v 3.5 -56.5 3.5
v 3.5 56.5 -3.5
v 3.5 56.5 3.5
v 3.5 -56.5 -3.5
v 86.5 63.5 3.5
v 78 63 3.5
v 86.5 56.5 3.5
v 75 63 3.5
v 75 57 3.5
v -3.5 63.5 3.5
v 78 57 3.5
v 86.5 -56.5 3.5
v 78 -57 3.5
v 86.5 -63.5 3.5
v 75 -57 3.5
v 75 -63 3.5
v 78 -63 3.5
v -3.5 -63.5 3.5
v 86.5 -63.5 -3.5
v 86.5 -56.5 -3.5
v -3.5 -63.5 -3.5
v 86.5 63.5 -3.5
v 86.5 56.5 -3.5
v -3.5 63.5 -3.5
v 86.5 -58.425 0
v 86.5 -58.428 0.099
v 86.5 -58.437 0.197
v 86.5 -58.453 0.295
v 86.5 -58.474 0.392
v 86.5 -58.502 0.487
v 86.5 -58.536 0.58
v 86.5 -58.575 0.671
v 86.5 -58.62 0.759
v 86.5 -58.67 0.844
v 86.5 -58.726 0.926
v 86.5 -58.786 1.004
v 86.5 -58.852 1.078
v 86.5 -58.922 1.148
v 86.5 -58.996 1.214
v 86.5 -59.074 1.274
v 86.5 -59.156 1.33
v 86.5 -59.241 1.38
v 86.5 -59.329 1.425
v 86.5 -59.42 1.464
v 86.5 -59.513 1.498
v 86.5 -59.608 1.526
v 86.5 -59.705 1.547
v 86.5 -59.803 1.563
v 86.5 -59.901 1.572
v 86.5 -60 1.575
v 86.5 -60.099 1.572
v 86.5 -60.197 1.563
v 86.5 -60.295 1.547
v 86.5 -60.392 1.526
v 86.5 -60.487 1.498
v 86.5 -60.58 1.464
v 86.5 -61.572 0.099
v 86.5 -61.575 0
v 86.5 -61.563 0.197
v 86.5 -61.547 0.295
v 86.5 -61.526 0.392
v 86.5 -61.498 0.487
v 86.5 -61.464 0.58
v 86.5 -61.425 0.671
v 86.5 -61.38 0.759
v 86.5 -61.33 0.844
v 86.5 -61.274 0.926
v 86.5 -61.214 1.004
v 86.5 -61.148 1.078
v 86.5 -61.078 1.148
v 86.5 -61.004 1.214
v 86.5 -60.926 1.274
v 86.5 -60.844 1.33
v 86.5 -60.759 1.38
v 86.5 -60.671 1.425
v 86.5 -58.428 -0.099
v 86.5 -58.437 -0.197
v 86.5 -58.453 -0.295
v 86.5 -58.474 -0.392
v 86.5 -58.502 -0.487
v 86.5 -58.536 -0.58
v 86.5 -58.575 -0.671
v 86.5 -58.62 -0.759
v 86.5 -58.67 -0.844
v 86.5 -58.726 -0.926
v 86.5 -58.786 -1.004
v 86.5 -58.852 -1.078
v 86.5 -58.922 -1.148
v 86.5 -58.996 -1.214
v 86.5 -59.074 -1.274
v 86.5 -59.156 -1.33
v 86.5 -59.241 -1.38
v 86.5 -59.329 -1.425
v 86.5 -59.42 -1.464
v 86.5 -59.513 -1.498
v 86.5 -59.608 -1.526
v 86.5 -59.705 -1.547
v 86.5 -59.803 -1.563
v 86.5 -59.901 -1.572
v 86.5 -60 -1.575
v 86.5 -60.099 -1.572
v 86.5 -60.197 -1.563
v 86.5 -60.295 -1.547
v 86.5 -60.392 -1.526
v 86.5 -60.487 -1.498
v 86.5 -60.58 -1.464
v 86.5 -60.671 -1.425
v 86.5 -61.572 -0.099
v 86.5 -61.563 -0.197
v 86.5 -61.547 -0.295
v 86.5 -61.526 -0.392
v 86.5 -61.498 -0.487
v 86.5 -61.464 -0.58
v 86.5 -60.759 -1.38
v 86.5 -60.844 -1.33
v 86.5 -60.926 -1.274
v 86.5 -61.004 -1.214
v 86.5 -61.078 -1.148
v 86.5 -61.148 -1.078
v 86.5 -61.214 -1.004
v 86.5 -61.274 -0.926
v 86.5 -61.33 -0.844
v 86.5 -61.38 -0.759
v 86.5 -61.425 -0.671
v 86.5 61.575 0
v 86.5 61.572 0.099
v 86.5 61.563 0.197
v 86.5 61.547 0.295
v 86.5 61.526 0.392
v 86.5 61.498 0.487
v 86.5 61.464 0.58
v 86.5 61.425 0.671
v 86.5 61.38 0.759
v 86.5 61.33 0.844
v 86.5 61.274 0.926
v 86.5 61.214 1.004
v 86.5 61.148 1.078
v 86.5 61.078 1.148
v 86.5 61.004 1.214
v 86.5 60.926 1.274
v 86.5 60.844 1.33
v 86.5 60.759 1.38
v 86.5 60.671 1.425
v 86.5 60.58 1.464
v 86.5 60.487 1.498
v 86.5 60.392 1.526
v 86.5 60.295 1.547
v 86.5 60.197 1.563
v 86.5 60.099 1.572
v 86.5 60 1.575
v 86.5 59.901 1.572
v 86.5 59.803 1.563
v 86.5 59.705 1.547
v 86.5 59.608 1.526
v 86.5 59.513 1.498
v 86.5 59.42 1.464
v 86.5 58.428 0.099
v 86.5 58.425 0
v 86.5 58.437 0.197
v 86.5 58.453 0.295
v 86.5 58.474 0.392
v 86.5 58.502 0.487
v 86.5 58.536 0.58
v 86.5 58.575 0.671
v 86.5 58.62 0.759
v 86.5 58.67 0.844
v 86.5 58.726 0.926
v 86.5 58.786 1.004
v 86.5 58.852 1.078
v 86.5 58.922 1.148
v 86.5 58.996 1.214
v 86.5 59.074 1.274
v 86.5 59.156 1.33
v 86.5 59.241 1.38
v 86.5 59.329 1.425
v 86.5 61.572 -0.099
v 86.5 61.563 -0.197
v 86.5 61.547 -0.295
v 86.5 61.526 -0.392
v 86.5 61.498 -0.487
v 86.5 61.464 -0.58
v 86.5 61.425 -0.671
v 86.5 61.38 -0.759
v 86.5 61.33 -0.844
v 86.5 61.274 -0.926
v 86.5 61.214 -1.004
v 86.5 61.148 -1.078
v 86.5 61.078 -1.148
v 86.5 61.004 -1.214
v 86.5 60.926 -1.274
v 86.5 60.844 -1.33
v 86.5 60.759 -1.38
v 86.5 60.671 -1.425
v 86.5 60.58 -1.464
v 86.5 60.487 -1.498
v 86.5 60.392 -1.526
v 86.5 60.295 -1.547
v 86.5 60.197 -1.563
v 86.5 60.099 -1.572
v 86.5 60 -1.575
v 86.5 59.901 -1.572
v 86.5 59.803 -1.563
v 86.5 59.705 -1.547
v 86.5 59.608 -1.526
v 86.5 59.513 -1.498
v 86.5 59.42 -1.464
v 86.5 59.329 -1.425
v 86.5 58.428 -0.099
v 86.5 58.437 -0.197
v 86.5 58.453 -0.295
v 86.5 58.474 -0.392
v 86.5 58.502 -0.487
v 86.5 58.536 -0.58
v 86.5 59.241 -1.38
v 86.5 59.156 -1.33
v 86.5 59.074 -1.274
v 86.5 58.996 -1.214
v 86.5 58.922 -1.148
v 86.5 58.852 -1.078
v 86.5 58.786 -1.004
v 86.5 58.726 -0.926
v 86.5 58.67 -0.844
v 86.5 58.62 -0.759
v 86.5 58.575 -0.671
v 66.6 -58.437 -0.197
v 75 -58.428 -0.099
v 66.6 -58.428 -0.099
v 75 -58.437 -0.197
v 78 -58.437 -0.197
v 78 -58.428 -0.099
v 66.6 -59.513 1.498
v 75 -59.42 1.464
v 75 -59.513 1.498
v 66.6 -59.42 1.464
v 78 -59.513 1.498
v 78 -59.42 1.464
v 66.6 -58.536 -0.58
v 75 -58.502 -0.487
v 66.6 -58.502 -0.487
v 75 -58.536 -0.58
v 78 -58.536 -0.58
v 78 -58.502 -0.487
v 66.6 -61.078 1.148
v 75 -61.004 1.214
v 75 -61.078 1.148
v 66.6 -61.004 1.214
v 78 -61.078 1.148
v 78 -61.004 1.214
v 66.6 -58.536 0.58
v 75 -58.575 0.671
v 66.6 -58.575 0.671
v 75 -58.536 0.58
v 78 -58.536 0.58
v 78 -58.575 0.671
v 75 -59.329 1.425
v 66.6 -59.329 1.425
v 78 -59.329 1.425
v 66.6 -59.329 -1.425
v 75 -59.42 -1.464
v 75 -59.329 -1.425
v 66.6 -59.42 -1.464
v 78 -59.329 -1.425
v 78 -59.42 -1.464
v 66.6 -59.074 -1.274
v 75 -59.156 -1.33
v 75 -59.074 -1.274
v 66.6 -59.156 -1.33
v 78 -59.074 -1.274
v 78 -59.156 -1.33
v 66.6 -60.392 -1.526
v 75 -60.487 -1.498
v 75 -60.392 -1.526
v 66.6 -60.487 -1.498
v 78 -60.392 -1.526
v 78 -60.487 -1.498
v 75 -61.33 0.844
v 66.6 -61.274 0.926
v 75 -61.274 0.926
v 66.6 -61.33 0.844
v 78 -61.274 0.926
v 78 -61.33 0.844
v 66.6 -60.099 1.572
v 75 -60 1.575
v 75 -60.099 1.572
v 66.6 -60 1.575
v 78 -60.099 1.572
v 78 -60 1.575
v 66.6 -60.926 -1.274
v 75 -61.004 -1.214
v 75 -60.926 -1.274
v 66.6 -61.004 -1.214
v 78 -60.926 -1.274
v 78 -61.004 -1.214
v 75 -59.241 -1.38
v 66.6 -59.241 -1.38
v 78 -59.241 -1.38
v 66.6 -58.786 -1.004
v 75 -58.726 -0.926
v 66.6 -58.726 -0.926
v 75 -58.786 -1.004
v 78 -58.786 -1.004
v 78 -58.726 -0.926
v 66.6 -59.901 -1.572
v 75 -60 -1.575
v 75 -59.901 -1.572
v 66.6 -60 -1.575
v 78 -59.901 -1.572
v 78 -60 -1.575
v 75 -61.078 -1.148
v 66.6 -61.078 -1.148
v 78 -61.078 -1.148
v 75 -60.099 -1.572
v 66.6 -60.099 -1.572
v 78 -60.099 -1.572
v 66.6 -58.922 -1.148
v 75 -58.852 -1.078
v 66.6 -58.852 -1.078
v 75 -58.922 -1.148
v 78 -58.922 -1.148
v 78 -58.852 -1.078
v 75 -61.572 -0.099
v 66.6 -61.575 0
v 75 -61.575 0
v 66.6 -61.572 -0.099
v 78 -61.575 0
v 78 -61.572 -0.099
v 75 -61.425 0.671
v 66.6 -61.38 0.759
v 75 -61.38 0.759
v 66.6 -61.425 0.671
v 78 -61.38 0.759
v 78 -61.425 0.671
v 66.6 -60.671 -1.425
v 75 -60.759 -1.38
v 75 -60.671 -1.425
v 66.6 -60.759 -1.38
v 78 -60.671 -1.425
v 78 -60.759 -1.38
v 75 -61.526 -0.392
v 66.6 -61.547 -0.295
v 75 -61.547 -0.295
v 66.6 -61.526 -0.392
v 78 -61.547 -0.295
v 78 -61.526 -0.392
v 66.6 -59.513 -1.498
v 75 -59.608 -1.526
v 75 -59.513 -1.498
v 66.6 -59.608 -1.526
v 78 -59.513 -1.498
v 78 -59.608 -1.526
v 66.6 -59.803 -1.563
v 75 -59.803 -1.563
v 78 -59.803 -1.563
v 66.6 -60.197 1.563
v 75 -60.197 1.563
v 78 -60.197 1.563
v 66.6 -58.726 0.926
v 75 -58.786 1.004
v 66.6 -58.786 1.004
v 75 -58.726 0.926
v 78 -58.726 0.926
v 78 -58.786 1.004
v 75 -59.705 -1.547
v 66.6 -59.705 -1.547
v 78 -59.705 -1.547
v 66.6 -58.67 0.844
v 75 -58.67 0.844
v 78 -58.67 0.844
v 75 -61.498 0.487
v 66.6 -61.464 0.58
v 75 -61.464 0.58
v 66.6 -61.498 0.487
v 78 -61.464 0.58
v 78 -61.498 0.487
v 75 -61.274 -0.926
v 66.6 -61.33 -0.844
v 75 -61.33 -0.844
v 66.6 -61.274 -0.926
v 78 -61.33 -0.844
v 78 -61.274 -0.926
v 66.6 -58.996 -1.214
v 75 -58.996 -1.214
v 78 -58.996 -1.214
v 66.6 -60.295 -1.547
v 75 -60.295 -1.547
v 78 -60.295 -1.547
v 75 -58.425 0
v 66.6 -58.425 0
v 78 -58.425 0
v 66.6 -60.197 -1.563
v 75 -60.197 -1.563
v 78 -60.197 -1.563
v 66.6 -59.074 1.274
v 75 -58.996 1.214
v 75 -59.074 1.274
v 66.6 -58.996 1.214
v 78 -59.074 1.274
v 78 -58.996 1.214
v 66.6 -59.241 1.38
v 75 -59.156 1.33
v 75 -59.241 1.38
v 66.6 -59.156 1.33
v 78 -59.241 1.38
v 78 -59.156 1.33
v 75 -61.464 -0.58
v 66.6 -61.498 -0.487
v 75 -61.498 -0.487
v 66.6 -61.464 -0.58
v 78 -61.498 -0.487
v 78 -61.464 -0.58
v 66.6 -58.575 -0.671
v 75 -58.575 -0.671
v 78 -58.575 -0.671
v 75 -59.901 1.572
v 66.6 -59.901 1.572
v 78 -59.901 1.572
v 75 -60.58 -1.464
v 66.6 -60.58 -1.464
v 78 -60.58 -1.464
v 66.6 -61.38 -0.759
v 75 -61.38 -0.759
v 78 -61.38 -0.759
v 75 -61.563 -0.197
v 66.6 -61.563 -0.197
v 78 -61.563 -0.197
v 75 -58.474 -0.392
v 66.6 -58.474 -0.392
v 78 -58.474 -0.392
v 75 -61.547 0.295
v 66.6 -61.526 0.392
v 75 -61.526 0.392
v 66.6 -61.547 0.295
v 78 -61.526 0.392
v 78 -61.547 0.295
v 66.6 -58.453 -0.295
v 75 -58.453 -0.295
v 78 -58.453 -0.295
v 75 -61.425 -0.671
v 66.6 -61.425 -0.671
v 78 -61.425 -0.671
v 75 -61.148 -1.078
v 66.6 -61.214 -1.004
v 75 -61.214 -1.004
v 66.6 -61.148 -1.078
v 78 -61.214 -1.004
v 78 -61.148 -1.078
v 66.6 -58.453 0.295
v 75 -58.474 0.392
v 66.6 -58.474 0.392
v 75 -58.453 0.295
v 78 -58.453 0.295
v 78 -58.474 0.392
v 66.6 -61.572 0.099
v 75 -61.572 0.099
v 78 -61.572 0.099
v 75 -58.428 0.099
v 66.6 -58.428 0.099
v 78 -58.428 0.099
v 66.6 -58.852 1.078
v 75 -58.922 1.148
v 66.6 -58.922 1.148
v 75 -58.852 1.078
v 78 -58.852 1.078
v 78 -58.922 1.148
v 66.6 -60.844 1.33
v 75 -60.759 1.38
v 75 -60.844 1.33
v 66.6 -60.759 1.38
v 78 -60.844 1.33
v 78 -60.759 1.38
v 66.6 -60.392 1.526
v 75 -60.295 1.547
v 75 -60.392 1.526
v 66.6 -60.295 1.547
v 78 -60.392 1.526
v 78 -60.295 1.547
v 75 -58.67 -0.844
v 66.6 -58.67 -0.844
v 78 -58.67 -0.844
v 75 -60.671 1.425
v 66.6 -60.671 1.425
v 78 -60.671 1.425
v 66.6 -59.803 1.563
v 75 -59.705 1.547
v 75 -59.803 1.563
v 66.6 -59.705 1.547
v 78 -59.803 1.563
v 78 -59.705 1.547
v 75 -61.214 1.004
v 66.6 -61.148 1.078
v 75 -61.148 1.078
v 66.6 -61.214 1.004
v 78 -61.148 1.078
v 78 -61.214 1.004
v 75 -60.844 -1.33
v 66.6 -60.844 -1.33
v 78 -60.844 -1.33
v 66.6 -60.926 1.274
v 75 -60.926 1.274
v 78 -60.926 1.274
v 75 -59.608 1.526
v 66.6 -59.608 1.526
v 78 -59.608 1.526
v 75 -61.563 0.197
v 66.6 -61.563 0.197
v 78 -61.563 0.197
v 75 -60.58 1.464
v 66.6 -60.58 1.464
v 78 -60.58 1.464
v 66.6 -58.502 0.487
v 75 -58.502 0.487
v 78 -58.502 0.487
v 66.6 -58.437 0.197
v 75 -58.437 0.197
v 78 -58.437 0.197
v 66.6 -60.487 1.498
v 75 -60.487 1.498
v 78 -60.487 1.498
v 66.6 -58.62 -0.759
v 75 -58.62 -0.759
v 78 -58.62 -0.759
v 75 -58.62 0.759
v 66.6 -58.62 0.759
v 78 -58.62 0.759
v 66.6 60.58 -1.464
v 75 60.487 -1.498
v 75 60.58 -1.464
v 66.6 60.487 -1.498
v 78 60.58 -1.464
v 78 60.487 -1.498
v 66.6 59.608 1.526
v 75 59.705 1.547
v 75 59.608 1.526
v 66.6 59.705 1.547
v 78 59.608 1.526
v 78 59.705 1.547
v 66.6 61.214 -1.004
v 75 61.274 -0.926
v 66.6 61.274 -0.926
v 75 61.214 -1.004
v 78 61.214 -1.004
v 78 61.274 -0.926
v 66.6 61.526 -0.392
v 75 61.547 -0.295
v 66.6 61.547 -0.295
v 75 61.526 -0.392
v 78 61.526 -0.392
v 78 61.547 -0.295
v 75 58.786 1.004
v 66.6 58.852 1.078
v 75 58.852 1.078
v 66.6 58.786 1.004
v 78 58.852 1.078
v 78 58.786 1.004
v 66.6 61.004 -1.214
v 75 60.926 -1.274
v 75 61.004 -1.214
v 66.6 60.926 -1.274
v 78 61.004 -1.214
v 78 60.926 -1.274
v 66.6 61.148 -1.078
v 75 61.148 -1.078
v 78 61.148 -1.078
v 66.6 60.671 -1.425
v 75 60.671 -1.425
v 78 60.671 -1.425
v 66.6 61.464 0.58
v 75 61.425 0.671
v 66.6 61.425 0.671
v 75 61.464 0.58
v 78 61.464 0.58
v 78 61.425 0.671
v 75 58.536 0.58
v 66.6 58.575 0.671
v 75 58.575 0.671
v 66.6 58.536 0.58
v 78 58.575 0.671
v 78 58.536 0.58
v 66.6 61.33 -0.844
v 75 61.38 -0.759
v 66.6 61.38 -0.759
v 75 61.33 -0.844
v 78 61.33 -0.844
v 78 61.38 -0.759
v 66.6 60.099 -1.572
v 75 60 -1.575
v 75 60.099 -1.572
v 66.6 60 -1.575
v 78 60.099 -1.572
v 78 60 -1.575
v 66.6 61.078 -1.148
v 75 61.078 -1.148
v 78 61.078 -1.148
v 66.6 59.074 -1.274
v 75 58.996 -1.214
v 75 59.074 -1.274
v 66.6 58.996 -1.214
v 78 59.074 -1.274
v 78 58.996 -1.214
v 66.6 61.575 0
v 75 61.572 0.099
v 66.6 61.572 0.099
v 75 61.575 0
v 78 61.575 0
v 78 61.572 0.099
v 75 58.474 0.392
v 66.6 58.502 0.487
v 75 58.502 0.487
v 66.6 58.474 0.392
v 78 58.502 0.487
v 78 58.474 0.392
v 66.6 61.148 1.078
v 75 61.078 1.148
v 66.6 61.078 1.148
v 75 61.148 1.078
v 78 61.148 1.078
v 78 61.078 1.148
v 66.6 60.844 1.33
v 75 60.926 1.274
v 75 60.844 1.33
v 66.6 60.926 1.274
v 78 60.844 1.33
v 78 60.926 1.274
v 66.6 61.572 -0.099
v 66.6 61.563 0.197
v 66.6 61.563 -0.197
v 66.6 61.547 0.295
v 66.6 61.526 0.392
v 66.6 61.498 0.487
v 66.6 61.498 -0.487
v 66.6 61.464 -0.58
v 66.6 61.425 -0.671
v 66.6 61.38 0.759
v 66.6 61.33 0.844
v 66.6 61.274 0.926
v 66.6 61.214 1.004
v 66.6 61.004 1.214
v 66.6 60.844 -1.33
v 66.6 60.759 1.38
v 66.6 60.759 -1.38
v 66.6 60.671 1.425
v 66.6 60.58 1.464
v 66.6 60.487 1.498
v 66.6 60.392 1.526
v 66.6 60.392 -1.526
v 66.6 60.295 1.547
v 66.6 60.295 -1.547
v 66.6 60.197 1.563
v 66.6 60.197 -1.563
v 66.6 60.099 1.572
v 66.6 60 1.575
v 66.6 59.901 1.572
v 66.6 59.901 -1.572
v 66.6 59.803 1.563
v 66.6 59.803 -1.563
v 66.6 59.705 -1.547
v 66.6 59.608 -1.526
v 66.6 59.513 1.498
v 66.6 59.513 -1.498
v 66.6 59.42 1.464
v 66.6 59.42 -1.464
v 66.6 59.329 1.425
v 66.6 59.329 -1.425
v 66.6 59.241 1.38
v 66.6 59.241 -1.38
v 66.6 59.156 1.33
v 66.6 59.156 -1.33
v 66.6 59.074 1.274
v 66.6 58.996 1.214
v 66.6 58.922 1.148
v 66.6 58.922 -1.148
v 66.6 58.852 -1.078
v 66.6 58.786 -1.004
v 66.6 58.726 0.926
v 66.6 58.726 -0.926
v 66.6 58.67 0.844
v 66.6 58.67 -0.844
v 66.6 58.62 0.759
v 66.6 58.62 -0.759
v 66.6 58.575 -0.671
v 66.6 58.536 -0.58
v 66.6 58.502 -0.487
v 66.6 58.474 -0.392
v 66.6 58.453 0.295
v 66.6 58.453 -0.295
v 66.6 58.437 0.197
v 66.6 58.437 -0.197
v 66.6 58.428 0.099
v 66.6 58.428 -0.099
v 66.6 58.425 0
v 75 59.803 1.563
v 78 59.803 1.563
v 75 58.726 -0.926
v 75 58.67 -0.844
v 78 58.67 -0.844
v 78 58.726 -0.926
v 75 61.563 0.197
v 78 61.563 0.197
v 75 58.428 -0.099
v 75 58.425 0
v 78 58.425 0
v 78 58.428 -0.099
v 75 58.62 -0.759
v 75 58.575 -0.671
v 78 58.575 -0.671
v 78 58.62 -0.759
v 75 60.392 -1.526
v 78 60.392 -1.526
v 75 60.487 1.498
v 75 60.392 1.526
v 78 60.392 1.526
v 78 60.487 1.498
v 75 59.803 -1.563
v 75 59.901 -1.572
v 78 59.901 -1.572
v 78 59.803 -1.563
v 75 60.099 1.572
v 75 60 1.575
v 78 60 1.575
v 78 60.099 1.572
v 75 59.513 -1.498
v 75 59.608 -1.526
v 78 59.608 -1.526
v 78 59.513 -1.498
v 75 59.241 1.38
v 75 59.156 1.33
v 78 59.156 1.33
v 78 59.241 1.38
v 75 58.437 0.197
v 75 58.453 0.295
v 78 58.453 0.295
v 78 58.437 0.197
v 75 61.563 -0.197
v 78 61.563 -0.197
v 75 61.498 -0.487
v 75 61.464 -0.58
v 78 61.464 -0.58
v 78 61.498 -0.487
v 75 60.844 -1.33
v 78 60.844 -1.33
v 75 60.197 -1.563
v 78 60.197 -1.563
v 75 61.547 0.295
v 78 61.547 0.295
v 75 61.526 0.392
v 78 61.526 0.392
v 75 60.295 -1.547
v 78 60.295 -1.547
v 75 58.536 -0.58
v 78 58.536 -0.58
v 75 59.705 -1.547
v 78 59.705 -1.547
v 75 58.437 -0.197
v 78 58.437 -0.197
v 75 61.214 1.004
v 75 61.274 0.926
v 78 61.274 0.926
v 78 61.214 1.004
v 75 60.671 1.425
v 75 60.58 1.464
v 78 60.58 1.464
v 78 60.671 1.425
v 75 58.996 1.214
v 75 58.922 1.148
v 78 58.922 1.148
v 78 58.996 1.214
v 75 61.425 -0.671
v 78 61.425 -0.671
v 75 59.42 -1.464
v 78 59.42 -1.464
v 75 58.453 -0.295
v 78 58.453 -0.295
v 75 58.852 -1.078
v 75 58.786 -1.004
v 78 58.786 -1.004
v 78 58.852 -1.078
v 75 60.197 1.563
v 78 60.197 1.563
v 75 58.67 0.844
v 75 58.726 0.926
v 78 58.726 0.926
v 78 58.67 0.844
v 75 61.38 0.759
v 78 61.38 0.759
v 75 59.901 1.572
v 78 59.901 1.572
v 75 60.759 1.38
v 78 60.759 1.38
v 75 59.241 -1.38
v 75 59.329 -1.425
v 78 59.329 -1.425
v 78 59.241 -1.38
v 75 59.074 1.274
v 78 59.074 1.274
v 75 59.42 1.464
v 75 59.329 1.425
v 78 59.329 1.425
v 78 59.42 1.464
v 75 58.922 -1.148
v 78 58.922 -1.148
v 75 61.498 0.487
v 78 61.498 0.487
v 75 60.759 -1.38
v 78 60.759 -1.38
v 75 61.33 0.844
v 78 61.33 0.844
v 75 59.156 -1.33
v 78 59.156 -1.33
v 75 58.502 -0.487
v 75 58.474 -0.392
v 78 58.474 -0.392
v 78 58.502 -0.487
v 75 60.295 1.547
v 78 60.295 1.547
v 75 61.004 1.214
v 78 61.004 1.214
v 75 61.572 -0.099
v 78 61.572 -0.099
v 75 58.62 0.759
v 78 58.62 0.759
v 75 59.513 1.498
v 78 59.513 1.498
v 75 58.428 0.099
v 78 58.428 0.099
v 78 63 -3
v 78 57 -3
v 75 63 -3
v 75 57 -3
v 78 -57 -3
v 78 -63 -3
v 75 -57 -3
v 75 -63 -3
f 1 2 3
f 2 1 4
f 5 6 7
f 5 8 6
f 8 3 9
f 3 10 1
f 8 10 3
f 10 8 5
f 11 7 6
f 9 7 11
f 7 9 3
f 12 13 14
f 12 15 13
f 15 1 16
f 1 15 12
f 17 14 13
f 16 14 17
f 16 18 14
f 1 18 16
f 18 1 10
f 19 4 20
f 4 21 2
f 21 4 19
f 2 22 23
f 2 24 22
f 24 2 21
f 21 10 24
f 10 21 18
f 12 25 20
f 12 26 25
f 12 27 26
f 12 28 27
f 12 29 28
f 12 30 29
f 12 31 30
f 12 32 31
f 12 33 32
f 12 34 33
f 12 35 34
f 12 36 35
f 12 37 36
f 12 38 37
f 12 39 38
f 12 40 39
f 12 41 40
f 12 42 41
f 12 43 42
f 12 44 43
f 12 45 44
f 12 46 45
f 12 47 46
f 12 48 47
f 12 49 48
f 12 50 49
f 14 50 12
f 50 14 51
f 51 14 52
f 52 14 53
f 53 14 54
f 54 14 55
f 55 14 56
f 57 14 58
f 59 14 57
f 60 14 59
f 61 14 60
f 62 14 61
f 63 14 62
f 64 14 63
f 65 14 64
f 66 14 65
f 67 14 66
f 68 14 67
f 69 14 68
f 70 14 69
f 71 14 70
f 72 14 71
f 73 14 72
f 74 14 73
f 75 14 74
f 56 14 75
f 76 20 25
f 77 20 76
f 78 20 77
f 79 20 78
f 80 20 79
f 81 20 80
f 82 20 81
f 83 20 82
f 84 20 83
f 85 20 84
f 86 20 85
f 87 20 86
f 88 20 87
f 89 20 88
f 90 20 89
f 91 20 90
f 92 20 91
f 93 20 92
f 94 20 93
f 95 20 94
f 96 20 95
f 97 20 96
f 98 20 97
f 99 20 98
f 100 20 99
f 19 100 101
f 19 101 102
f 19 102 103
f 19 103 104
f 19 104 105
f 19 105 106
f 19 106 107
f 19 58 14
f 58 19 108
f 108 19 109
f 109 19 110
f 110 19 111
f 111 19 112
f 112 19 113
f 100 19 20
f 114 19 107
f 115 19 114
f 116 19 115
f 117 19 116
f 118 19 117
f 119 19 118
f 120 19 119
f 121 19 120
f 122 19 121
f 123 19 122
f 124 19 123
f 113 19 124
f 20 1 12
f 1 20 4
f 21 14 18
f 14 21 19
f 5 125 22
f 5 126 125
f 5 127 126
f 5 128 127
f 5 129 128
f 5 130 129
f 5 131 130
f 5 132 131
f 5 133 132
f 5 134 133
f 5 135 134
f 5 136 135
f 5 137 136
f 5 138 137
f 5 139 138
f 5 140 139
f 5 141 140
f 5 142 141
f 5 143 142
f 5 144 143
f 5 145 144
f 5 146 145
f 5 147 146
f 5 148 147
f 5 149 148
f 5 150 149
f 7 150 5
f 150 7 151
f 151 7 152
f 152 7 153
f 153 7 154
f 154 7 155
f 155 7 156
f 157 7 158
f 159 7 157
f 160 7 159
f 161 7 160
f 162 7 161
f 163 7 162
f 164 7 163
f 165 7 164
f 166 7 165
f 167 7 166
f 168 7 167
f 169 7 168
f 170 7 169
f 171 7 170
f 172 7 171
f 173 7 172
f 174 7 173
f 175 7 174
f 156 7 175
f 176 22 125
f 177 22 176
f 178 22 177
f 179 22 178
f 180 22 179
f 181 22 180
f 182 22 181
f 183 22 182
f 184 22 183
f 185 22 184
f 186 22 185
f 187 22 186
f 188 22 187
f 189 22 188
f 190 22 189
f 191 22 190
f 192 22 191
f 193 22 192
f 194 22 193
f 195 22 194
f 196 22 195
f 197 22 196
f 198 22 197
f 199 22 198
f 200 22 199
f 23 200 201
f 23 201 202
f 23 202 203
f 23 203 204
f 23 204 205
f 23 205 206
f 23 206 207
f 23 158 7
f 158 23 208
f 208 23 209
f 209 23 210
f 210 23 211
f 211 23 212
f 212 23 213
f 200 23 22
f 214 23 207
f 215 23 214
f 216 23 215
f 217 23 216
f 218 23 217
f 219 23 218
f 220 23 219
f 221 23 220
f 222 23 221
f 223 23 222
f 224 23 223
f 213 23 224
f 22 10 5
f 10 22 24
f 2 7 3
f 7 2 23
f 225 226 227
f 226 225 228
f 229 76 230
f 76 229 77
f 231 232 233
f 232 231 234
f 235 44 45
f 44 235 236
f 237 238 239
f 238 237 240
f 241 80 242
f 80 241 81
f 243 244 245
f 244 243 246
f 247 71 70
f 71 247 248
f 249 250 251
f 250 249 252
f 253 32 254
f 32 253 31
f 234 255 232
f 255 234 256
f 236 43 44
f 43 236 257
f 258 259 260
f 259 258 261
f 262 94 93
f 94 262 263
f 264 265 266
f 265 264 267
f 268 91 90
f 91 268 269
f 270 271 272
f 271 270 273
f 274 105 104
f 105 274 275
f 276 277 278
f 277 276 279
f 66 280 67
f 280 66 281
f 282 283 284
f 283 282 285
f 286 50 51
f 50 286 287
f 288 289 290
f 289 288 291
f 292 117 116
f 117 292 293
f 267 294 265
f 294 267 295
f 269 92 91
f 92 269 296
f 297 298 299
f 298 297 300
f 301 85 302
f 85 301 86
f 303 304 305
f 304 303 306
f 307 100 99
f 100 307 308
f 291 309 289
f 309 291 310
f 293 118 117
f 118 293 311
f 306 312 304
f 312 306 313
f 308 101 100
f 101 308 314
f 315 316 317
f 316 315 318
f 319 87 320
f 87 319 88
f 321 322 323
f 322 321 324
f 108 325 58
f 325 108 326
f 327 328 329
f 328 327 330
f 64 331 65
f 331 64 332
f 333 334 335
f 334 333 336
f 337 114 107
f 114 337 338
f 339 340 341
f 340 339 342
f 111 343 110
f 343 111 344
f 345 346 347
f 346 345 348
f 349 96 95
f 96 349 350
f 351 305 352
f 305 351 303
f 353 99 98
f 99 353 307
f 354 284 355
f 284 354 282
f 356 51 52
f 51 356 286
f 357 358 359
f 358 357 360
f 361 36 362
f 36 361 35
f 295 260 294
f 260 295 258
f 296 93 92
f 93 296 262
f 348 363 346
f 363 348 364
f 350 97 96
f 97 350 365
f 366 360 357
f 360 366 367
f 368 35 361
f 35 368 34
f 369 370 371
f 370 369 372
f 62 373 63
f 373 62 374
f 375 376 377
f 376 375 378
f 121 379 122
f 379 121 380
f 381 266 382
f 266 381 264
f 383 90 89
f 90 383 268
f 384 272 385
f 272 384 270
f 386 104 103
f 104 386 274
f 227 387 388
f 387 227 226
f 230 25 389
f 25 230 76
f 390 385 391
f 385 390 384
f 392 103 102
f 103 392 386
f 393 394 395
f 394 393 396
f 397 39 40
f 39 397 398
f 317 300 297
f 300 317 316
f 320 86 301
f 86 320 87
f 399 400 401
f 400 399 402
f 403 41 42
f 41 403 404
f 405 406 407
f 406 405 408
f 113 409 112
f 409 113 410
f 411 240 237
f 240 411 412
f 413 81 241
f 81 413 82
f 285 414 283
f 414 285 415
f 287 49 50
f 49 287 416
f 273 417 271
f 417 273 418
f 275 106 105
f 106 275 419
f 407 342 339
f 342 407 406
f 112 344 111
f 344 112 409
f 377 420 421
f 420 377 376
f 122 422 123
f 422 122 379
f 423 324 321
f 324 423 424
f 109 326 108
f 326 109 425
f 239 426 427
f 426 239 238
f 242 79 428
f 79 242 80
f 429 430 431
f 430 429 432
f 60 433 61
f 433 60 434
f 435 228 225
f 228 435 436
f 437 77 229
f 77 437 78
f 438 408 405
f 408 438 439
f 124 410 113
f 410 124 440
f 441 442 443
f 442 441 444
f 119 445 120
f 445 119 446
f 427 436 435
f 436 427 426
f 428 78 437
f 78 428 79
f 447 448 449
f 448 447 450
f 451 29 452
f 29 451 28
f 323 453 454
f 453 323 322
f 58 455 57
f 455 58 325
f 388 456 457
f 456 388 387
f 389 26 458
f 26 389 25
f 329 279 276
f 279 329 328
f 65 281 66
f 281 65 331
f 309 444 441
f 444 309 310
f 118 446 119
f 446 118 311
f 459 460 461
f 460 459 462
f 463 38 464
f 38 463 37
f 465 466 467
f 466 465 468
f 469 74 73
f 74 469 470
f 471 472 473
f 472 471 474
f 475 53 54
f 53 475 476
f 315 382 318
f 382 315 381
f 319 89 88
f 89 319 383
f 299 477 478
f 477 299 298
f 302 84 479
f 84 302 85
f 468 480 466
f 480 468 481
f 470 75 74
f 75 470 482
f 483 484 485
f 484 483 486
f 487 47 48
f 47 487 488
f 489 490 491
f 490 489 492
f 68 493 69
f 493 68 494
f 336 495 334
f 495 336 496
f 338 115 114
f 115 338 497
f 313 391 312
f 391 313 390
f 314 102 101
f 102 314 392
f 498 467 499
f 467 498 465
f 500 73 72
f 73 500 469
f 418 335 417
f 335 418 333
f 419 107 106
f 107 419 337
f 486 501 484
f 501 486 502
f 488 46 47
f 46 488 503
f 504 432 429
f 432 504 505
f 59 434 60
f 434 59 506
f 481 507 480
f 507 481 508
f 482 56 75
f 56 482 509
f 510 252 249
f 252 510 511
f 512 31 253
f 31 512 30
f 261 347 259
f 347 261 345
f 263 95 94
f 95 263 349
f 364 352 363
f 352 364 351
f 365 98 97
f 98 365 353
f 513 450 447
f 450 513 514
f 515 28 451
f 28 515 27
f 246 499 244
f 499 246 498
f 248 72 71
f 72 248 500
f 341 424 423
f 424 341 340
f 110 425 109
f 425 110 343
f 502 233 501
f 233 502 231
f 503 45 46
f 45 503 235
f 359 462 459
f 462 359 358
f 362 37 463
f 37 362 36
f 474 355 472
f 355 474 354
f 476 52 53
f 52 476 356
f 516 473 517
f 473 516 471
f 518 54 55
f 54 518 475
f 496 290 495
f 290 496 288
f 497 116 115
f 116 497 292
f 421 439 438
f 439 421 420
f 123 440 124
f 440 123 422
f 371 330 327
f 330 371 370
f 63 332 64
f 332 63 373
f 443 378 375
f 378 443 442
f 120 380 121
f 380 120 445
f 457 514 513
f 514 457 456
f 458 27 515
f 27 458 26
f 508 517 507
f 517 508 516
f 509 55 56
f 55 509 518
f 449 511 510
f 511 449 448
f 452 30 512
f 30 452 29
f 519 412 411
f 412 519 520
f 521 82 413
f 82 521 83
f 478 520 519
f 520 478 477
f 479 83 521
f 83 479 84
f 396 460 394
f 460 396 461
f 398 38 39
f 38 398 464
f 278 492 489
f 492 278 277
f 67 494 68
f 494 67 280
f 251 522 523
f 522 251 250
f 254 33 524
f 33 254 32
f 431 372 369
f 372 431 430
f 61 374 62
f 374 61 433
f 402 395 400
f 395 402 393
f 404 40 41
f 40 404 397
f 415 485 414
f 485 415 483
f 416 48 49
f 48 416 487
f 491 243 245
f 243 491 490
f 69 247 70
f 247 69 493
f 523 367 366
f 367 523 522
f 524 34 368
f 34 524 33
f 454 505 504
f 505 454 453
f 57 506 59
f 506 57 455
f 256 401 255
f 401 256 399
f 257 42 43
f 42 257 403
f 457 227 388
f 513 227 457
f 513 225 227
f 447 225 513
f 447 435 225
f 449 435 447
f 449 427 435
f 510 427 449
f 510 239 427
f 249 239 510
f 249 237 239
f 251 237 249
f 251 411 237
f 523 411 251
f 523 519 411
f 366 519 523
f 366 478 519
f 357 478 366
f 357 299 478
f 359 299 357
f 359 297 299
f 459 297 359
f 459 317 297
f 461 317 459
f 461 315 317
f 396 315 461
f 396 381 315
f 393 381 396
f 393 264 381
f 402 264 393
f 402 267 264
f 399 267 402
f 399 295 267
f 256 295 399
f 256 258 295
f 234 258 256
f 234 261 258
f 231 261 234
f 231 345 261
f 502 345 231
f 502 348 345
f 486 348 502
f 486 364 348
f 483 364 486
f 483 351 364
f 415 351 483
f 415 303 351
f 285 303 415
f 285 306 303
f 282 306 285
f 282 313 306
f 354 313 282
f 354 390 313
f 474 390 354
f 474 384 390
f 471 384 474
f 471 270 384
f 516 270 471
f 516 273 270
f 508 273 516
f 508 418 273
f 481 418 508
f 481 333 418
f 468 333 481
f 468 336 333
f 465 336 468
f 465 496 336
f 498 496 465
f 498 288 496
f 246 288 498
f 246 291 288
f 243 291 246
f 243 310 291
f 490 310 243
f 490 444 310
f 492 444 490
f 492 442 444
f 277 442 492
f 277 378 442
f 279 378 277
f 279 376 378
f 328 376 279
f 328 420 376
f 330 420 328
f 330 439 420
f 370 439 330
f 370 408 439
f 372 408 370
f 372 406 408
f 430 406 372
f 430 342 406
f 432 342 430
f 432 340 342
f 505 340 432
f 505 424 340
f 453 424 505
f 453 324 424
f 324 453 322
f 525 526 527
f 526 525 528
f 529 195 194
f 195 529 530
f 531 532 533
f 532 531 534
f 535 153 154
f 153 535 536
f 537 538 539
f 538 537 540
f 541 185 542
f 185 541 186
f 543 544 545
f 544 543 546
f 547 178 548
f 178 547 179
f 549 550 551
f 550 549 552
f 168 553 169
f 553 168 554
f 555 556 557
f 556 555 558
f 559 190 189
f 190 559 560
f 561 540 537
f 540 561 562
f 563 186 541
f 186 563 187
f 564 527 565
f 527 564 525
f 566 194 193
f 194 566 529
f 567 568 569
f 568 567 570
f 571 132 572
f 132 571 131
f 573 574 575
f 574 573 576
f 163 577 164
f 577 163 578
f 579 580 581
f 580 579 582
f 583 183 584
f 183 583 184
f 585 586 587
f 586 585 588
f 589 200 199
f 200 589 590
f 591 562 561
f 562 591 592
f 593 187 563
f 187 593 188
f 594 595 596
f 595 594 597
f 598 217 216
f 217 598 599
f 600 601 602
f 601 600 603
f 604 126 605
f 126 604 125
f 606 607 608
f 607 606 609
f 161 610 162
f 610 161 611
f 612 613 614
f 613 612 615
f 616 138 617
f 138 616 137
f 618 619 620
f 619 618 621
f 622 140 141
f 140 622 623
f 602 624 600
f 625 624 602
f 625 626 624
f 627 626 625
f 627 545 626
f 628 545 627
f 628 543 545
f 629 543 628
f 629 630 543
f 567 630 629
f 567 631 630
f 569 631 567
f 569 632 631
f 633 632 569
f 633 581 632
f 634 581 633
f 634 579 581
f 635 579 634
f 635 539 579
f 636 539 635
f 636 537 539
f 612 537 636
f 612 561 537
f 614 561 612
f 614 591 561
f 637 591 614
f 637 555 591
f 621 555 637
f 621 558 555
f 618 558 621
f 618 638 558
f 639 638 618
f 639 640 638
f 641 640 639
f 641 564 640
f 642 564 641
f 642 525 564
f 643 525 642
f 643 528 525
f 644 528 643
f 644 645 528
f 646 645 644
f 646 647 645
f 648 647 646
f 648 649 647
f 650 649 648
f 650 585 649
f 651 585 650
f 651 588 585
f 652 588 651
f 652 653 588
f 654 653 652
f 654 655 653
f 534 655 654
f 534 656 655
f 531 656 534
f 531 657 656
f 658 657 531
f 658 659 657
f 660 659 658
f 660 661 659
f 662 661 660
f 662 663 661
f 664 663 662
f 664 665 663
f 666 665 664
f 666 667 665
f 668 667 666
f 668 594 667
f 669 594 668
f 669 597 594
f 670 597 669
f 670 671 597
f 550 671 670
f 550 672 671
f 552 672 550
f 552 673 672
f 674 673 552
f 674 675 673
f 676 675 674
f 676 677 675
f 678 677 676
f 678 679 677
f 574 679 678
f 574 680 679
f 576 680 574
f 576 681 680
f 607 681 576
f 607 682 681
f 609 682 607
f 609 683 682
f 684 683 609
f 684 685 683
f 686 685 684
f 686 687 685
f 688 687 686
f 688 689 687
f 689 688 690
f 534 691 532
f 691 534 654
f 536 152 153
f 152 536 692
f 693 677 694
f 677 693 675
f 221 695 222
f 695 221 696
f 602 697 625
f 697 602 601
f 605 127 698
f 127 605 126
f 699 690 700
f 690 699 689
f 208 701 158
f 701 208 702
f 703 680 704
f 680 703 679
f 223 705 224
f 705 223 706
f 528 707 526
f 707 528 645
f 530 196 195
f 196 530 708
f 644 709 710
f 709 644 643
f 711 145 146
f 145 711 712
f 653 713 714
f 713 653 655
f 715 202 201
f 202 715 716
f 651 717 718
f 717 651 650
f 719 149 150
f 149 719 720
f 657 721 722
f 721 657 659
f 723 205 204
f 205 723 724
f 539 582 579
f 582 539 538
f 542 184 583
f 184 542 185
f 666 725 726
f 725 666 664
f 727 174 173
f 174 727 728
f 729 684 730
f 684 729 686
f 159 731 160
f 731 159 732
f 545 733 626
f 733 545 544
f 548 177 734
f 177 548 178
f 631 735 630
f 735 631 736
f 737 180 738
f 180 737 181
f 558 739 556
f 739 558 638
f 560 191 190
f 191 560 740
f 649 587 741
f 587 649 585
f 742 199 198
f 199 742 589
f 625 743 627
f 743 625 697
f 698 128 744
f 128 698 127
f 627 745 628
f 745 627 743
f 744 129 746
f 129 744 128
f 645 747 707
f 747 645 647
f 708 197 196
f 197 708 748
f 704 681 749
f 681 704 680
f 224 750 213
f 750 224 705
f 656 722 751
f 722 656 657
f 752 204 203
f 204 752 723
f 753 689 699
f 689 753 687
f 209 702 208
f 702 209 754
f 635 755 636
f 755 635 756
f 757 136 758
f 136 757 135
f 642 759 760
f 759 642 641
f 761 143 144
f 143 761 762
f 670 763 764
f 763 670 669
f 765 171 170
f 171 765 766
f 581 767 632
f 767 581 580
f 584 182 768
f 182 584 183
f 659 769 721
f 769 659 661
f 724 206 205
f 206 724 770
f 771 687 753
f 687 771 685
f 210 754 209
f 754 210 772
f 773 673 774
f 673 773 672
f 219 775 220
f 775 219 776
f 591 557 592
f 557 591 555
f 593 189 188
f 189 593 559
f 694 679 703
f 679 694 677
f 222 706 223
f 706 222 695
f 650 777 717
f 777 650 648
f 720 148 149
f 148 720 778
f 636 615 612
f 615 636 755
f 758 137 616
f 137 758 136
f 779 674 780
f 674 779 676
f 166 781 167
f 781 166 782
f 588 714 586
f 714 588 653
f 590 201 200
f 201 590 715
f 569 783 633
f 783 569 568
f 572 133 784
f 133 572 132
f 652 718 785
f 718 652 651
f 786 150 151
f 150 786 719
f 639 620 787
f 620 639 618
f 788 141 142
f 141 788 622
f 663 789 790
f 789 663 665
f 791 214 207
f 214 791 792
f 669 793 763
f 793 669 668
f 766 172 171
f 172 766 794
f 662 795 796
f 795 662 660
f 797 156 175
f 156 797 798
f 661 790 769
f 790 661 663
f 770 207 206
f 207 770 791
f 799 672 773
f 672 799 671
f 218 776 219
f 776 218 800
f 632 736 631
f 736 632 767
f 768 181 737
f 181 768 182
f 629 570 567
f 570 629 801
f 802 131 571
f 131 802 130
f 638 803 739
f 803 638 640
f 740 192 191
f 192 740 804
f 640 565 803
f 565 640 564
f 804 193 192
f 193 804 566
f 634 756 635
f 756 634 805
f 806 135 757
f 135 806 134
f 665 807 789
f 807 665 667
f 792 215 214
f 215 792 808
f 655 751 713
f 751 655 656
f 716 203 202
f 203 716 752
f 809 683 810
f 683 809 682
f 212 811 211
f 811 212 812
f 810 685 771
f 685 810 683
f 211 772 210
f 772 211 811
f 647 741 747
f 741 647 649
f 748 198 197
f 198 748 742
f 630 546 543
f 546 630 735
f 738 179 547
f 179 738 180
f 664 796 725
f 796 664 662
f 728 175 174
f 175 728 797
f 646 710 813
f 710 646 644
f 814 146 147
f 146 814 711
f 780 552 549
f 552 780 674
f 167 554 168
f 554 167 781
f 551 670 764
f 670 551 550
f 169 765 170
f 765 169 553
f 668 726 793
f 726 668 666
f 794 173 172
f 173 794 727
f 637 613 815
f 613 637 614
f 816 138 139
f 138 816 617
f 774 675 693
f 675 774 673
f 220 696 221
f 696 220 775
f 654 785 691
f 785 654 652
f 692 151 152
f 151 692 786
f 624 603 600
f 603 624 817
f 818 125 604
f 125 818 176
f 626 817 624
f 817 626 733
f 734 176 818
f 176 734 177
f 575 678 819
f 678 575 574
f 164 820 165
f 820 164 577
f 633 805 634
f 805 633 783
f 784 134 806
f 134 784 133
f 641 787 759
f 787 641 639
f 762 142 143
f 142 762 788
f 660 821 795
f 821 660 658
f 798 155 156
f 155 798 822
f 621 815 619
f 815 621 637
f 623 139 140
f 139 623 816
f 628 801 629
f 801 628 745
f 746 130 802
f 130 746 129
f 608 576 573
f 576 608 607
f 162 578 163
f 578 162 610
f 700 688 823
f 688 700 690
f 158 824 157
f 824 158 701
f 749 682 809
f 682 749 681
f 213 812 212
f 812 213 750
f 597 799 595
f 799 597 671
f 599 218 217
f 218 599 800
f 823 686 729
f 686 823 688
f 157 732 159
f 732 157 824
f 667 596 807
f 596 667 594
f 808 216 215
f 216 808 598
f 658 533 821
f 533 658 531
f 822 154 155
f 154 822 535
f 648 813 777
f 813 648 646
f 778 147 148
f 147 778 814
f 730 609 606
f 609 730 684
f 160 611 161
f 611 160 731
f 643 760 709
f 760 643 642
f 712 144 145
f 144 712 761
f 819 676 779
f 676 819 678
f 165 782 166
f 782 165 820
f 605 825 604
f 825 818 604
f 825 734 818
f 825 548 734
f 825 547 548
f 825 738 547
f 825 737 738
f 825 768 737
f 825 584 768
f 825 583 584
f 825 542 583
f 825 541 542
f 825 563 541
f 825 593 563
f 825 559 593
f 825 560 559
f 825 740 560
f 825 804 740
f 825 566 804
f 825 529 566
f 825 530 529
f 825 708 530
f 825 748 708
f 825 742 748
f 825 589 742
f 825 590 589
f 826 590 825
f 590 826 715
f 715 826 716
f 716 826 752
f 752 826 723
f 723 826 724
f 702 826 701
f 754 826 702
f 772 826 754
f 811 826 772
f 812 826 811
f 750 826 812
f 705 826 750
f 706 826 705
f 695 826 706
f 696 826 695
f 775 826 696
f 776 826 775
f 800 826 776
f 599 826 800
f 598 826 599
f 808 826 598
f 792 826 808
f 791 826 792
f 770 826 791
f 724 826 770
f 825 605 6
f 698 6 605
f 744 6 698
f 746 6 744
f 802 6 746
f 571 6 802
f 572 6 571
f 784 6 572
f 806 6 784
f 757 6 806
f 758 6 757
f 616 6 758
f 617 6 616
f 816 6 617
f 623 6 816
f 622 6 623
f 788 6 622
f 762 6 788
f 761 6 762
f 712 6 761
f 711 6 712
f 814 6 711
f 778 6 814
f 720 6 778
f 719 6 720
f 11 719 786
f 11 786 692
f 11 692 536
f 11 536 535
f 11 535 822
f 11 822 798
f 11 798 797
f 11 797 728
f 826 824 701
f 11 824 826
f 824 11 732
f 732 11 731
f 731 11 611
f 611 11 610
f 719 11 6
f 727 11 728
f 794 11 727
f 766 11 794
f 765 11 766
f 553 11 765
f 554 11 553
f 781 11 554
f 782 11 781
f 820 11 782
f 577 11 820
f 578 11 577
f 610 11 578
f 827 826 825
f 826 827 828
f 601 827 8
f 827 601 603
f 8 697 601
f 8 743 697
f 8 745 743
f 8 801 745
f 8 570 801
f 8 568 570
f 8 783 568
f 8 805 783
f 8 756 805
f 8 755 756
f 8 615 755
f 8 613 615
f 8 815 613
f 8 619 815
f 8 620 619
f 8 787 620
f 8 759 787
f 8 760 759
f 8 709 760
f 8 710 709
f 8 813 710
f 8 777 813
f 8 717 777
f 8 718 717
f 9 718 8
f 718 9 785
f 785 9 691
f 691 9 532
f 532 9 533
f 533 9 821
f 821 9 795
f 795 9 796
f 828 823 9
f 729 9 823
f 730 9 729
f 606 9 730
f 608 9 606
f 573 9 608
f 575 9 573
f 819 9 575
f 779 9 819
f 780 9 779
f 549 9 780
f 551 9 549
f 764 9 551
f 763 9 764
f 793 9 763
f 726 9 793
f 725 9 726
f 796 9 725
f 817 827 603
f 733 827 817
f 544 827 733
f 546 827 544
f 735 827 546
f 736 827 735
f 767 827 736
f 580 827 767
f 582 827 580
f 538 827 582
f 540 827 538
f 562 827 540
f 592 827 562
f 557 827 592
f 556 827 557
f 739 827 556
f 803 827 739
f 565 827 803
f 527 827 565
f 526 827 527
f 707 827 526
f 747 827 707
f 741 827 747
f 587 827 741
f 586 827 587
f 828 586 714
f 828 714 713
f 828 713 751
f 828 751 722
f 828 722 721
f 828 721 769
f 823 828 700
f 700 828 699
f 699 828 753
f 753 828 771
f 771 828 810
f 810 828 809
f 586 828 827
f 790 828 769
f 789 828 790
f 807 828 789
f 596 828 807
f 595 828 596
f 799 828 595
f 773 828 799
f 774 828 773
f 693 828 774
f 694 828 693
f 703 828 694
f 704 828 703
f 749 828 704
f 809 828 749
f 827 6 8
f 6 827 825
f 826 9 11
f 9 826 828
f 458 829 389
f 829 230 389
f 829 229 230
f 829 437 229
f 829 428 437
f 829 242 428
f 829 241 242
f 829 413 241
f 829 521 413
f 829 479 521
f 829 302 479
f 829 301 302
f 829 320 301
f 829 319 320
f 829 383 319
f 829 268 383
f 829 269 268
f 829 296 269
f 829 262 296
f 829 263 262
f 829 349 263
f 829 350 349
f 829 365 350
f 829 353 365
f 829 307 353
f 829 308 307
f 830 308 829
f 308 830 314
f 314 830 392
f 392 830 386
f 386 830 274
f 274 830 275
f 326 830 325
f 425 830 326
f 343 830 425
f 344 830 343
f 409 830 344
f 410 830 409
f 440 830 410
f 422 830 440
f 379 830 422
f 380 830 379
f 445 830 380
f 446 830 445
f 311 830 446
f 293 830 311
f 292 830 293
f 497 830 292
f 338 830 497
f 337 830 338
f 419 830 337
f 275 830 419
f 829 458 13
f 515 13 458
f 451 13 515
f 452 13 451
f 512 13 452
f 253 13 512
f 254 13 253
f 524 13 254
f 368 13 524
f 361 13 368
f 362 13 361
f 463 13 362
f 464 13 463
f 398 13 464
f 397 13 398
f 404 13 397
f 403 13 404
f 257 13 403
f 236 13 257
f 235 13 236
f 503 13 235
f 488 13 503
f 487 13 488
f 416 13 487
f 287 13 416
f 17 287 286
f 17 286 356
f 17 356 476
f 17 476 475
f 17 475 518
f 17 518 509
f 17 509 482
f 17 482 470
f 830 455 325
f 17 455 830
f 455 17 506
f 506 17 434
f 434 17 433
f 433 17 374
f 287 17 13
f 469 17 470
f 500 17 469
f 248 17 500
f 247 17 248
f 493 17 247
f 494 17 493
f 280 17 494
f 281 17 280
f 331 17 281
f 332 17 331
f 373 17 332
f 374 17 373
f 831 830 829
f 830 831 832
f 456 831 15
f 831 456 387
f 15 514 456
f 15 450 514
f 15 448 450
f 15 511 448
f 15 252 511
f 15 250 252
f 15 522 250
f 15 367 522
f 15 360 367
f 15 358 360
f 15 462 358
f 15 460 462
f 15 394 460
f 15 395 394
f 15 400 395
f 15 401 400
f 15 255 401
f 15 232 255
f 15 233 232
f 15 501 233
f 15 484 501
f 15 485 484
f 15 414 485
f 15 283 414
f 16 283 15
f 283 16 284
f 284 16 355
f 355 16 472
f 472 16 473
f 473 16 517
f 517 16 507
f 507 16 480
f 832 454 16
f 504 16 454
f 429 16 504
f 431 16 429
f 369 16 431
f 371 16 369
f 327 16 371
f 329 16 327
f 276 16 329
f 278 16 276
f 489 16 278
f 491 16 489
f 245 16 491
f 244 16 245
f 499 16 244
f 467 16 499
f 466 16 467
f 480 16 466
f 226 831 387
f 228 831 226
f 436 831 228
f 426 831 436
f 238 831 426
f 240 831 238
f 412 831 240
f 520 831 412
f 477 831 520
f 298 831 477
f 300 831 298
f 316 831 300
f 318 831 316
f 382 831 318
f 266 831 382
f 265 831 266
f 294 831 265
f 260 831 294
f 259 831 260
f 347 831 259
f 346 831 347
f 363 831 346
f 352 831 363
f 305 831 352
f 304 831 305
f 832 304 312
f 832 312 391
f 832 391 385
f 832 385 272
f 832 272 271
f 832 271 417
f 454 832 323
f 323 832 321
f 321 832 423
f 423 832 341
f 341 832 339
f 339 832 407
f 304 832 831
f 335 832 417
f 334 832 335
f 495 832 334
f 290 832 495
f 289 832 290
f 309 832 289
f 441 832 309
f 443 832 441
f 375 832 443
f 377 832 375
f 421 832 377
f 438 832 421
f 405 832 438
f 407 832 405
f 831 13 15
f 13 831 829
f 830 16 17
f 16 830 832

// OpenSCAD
$fn=100;
grow = 1.05;

module arm(l, h, w, screw_d, screw_l, nut_d, nut_h) {
    difference() {

        intersection() {
        
            /*union() {
                rotate([90, 0, 0])
                    cylinder(l, d=w*1.25, center=true);
                translate([h/2-w/2, -l/2, 0])
                    rotate([90, 0, 90])
                        cylinder(h, d=w*1.25, center=true);
                translate([h/2-w/2, l/2, 0])    
                    rotate([90, 0, 90])
                        cylinder(h, d=w*1.25, center=true);
            }*/

            union() {
                cube([w, l, w], center=true);
                translate([h/2-w/2, -l/2, 0])
                    cube([h, w, w], center=true);
                translate([h/2-w/2, l/2, 0])    
                    cube([h, w, w], center=true);
            }
            
        }
        
        translate([h-screw_l-w/2+0.1, -l/2, 0])
            rotate([0, 90, 0])
                cylinder(screw_l, d=screw_d*grow);
        translate([h-screw_l-w/2+0.1, l/2, 0])
            rotate([0, 90, 0])
                cylinder(screw_l, d=screw_d*grow);
        translate([h-screw_l/2-w/2, l/2, w/2-nut_d/2])
            cube([nut_h, nut_d, w], center=true);
        translate([h-screw_l/2-w/2, -l/2, w/2-nut_d/2])
            cube([nut_h, nut_d, w], center=true);
    }
}

module stopper(d, h, screw_d) {
    difference() {
        cylinder(h, d=d, center=true);
        cylinder(h*1.1, d=screw_d*grow, center=true);
    }
}

arm(120, 90, 7, 3, 20, 6, 3);
//stopper(20, 3, 3);
